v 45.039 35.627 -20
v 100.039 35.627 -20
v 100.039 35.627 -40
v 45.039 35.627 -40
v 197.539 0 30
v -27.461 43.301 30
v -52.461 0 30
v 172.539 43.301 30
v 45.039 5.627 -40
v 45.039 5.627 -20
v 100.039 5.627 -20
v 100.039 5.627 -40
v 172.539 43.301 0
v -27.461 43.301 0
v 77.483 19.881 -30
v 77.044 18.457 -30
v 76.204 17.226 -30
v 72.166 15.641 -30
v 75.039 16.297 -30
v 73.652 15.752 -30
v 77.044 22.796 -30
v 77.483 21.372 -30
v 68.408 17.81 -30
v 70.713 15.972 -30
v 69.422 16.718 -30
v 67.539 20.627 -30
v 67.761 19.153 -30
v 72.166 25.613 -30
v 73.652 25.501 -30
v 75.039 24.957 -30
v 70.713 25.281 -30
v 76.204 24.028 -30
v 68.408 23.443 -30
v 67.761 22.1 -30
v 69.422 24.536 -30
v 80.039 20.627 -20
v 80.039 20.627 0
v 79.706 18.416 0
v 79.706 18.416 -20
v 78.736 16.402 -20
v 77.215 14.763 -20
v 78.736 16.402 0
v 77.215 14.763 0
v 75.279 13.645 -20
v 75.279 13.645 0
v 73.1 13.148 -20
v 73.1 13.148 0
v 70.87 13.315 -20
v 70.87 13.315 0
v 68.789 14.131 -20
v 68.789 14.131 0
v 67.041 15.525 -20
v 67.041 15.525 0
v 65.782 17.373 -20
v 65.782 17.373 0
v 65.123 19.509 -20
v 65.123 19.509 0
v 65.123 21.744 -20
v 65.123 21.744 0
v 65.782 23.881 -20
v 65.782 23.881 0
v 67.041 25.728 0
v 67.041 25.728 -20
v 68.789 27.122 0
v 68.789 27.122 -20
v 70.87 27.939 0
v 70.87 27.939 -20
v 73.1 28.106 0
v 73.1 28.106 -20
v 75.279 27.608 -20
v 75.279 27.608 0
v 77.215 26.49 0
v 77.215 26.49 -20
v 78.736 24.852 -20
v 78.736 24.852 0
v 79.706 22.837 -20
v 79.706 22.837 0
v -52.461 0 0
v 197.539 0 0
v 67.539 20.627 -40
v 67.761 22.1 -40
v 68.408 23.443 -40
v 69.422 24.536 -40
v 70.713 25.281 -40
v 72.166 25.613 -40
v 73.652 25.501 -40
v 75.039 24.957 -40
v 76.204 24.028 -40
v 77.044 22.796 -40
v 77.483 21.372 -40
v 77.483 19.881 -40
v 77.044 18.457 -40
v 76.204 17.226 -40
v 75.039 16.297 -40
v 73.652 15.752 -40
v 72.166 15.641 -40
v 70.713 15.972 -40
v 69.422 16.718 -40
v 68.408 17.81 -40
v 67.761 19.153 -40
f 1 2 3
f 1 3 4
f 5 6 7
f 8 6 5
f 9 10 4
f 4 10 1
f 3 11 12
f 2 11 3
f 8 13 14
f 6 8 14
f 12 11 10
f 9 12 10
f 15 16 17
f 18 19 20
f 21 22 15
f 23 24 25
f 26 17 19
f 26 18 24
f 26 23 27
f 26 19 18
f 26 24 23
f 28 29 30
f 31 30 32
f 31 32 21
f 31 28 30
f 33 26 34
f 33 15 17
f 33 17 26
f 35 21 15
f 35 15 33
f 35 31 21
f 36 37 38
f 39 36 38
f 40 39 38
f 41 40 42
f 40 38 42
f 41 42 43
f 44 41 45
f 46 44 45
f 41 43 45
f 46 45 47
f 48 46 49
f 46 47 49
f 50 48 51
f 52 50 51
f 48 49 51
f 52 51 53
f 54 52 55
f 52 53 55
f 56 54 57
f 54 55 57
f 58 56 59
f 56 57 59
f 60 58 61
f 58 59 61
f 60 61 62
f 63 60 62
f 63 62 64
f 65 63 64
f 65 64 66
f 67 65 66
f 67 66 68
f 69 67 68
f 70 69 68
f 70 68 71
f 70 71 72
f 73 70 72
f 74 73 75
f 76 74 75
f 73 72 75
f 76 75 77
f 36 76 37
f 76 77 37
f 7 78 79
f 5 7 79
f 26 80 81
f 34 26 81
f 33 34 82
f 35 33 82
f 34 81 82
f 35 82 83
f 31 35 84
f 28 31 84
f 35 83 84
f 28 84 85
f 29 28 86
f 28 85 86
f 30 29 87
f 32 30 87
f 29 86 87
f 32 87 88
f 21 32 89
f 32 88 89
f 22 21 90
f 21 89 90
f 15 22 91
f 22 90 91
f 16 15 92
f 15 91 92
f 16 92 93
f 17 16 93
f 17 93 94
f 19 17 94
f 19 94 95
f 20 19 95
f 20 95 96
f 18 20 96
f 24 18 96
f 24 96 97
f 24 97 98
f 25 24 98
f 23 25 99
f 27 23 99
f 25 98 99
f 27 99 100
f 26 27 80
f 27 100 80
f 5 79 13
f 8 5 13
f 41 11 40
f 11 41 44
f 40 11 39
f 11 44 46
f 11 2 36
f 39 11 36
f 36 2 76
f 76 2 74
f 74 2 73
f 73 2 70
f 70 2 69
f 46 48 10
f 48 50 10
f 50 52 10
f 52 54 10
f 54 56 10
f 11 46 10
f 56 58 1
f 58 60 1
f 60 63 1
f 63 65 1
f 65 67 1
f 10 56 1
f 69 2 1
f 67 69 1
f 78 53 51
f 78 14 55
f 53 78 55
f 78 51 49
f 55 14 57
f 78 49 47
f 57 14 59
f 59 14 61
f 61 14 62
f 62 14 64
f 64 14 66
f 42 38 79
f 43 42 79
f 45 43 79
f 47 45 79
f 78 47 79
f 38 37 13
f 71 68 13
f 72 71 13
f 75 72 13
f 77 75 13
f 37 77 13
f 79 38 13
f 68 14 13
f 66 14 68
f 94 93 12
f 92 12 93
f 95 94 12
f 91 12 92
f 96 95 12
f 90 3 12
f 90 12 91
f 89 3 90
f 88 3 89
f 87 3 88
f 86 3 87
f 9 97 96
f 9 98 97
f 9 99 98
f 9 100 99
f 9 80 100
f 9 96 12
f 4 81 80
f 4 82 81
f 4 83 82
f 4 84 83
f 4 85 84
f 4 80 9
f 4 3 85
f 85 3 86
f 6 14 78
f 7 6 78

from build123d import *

# Parameters (mm, degrees)
EXTRUDE_1_DEPTH     = 30
SKETCH_2_R          = 7.5
EXTRUDE_2_DEPTH     = 20
SKETCH_3_W          = 55
SKETCH_3_H          = 30
EXTRUDE_3_DEPTH     = 20
SKETCH_4_R          = 5
CUT_EXTRUDE_1_DEPTH = 10


with BuildPart() as part:
    # 草图1 → 凸台-拉伸1 (new body)
    with BuildSketch(Plane.XY):
        Polygon((-52.460777496, 0), (197.539222504, 0), (172.539222504, 43.301270189), (-27.460777496, 43.301270189), align=None)
    extrude(amount=EXTRUDE_1_DEPTH)

    # 草图2 → 凸台-拉伸2 (add)
    with BuildSketch(Plane(origin=(0, 0, 0), x_dir=(-1, 0, 0), z_dir=(0, 0, -1))):
        with Locations(Location((-72.539222504, 20.626682139, 0), (0, 0, 180))):
            Circle(SKETCH_2_R)
    extrude(amount=EXTRUDE_2_DEPTH)

    # 草图3 → 凸台-拉伸3 (add)
    with BuildSketch(Plane(origin=(0, 0, -20), x_dir=(-1, 0, 0), z_dir=(0, 0, -1))):
        with Locations((-72.539222504, 20.626682139)):
            Rectangle(SKETCH_3_W, SKETCH_3_H)
    extrude(amount=EXTRUDE_3_DEPTH)

    # 草图4 → 切除-拉伸1 (cut)
    with BuildSketch(Plane(origin=(0, 0, -40), x_dir=(-1, 0, 0), z_dir=(0, 0, -1))):
        with Locations((-72.539222504, 20.626682139)):
            Circle(SKETCH_4_R)
    extrude(amount=-CUT_EXTRUDE_1_DEPTH, mode=Mode.SUBTRACT)


solid = part.part
